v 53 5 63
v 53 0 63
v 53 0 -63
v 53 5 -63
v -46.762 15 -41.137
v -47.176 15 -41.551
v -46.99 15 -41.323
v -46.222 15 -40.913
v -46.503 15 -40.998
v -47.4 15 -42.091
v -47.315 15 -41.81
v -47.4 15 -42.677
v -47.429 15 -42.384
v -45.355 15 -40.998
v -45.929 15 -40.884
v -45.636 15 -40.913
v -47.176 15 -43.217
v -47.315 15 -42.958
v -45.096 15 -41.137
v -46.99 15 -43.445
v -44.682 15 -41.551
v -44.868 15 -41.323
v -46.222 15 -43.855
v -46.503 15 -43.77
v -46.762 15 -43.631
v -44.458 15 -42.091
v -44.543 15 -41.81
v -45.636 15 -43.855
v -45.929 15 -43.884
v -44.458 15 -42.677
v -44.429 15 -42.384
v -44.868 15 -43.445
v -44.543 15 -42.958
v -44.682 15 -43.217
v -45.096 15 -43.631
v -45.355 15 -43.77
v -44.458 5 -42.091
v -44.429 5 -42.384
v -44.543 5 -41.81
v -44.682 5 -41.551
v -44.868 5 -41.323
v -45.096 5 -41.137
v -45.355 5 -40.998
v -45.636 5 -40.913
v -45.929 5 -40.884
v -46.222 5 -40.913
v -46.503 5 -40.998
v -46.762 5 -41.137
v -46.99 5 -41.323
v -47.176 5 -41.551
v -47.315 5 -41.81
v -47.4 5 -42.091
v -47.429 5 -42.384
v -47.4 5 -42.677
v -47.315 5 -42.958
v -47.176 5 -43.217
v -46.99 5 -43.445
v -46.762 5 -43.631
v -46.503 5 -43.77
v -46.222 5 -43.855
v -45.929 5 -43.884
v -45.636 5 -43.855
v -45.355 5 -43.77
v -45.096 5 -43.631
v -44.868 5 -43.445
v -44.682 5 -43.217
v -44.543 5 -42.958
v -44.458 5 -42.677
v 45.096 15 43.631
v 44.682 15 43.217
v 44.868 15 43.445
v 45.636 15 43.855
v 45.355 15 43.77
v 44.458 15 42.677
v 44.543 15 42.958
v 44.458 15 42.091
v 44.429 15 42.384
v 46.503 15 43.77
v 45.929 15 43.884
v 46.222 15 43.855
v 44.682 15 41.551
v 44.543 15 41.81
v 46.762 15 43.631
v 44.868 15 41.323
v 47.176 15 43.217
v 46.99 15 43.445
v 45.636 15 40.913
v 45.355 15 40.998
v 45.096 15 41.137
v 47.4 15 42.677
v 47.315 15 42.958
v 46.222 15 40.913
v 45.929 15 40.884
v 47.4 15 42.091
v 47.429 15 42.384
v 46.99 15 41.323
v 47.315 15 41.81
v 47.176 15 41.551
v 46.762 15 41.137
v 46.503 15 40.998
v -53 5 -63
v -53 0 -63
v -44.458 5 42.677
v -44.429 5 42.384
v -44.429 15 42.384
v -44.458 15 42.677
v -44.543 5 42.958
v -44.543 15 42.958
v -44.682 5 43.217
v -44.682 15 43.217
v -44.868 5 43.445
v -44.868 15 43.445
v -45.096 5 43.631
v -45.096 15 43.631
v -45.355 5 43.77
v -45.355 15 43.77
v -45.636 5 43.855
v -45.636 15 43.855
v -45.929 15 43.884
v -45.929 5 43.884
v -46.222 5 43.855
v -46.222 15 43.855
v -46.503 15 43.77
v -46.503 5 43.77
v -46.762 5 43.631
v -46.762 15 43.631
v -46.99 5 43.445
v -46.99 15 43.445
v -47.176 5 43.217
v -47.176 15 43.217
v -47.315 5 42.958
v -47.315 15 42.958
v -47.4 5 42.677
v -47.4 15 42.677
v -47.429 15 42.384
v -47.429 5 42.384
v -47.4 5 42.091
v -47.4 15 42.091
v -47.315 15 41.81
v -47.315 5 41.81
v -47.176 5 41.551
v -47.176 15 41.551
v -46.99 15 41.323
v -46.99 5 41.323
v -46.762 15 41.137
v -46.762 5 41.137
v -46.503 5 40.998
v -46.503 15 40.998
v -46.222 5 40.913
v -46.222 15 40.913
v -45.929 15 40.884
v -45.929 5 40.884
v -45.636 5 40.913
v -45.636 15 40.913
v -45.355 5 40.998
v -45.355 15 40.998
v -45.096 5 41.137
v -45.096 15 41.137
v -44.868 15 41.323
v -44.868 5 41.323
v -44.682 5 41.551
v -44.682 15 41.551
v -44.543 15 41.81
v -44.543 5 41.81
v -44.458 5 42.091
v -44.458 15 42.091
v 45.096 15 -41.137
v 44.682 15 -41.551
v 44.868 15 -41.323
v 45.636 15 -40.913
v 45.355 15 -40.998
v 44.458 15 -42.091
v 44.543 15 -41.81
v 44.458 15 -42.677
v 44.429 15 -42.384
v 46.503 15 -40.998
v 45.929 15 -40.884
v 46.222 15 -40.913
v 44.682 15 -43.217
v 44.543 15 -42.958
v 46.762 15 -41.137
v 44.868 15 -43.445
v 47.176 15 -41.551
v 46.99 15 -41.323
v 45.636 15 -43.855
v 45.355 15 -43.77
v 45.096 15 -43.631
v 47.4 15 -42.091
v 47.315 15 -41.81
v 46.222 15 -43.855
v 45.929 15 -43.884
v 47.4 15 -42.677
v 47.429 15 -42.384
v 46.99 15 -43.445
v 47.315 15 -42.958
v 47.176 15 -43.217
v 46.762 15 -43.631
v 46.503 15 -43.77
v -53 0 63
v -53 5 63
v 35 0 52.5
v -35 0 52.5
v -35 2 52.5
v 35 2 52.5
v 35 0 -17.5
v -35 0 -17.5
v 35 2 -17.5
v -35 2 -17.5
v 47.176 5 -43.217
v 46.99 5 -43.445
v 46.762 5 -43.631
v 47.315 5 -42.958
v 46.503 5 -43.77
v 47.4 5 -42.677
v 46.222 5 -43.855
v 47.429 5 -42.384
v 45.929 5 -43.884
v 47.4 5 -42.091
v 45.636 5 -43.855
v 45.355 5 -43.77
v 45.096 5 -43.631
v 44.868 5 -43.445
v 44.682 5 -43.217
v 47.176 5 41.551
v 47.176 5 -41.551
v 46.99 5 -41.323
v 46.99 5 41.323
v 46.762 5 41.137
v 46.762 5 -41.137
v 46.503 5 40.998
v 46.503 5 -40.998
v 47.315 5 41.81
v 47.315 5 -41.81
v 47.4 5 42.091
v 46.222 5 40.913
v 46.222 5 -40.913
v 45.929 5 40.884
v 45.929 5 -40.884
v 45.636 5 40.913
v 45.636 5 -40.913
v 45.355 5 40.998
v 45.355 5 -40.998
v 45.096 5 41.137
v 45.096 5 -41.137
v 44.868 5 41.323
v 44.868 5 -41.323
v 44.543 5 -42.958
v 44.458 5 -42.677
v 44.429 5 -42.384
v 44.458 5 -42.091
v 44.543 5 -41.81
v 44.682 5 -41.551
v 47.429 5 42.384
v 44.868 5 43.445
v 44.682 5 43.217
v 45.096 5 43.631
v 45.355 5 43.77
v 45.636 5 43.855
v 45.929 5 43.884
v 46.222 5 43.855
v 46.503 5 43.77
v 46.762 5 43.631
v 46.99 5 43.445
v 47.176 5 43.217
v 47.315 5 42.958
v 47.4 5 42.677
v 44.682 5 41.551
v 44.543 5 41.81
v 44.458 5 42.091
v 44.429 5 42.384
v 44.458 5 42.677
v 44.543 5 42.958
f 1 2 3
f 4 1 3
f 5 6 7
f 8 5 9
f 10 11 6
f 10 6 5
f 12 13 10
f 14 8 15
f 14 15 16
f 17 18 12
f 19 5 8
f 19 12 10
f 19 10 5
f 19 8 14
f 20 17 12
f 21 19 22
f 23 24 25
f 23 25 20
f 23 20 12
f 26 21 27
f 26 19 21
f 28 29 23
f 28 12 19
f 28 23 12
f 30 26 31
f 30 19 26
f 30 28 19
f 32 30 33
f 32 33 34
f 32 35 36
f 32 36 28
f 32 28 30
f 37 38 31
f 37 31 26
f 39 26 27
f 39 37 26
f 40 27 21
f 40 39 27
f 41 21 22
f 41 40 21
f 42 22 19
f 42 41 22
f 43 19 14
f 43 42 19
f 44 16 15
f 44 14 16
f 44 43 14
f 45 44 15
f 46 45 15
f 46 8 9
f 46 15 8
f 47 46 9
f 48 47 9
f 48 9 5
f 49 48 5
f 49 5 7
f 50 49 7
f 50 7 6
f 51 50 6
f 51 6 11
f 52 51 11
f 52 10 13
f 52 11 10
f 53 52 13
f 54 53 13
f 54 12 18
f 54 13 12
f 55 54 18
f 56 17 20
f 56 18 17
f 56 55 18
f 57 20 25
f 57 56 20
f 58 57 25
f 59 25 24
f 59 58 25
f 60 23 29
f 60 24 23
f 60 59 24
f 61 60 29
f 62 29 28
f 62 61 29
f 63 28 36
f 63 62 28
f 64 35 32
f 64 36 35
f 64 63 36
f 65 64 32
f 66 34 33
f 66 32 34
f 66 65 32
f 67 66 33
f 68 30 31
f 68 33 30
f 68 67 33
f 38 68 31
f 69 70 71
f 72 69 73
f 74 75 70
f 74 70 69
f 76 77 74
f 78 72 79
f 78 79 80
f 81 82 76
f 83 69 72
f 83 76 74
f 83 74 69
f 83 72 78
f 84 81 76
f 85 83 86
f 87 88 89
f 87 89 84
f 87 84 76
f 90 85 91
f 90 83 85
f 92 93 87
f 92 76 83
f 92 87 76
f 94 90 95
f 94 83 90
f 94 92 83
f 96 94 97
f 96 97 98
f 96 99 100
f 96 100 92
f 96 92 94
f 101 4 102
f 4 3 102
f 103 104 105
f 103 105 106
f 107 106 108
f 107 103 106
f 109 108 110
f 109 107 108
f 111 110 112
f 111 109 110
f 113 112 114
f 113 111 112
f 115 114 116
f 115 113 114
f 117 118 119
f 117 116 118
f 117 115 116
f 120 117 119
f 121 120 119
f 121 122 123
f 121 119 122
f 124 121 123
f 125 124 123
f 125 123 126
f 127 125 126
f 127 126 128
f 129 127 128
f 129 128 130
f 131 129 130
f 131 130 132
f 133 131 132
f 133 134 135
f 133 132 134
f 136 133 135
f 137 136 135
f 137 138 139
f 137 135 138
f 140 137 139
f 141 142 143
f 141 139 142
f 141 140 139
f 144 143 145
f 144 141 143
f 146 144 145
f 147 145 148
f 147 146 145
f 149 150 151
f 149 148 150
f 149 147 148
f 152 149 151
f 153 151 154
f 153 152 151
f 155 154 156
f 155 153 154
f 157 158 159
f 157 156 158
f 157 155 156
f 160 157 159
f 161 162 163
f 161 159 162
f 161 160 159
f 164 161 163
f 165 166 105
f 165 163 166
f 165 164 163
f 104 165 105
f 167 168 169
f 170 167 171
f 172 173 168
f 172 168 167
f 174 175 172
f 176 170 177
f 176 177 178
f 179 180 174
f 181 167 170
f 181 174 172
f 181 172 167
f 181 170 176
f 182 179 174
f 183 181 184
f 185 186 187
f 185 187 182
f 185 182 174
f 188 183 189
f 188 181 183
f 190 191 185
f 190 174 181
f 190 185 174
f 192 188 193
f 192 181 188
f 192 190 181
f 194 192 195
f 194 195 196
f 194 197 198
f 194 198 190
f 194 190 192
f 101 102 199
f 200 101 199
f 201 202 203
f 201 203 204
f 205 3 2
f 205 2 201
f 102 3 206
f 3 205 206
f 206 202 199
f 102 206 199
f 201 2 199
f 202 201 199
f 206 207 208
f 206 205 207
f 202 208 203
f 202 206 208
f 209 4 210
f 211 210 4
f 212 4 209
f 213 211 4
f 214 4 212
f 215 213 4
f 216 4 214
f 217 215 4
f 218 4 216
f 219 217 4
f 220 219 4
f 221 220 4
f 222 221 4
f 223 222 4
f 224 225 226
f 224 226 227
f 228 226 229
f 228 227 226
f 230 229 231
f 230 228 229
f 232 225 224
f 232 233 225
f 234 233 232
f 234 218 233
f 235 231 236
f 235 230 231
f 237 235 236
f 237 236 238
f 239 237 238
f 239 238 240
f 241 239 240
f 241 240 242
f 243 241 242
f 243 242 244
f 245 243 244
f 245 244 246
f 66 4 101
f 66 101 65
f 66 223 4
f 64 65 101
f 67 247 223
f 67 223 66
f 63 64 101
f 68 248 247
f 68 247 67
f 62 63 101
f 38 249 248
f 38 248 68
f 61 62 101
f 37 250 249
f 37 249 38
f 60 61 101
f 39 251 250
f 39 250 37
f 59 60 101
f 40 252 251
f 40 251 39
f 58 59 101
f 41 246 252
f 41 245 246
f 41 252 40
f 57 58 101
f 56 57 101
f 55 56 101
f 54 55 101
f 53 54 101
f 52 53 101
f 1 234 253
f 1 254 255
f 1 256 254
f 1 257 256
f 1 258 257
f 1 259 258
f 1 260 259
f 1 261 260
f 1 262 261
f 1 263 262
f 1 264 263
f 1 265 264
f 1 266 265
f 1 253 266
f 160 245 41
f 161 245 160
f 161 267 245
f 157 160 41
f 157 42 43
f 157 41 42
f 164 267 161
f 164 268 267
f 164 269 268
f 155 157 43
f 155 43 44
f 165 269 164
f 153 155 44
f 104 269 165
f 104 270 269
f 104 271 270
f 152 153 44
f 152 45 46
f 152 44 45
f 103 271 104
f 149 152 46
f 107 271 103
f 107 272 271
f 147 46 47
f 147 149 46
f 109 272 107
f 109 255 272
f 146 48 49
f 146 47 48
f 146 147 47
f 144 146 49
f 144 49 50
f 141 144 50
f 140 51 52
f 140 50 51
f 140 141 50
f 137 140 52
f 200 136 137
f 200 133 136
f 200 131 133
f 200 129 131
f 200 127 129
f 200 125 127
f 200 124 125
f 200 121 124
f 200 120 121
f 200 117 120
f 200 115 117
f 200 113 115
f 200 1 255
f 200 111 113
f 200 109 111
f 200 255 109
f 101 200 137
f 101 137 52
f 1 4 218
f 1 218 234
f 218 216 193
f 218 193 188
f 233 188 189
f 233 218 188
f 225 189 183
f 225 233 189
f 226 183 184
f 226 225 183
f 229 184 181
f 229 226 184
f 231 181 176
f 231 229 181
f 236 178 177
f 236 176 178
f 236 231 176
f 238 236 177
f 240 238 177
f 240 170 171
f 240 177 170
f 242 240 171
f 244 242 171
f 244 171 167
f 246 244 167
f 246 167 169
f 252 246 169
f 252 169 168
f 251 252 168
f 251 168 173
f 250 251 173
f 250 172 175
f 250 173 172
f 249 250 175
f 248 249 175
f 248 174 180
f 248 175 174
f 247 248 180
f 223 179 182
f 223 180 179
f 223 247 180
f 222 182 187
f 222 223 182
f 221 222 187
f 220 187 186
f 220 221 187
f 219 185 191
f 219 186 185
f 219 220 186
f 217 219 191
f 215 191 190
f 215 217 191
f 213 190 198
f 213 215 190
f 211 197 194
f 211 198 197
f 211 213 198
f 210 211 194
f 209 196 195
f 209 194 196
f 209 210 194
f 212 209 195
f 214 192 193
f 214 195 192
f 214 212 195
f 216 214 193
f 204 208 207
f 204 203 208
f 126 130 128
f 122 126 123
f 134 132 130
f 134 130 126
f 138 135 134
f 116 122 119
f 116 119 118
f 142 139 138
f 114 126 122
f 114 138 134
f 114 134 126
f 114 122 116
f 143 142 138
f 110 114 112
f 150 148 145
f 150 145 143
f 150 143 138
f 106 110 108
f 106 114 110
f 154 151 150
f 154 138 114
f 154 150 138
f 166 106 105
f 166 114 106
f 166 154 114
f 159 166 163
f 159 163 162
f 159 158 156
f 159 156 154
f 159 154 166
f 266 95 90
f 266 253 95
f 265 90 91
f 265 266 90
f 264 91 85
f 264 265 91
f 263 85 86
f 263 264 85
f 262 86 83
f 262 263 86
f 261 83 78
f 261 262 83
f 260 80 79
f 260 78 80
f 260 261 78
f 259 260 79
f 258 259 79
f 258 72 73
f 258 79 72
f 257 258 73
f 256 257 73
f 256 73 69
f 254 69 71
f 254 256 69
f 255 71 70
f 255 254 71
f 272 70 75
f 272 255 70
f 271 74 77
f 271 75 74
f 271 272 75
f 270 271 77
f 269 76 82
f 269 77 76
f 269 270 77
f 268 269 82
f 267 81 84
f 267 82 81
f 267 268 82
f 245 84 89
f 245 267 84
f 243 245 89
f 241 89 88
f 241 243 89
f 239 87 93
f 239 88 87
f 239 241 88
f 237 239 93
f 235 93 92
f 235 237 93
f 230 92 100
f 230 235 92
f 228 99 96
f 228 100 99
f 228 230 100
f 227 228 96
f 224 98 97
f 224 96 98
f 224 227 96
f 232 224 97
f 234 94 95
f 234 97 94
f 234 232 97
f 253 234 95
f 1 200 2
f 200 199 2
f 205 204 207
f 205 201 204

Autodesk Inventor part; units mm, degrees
ref_plane "YZ Plane" through (0, 0, 0) normal (1, 0, 0) x (0, 1, 0)
ref_plane "XZ Plane" through (0, 0, 0) normal (0, 1, 0) x (-1, 0, 0)
ref_plane "XY Plane" through (0, 0, 0) normal (0, 0, 1) x (1, 0, 0)
sketch "Boceto1" plane through (0, 0, 0) normal (0, 1, 0) x (-1, 0, 0)
  line L0 (53, 63) -> (-53, 63)
  line L1 (-53, 63) -> (-53, -63)
  line L2 (-53, -63) -> (53, -63)
  line L3 (53, -63) -> (53, 63)
  point P0 (0, 0)
  point P1 (0, 63)
  dimension "d1" = 106
  dimension "d2" = 126
  dimension "d3" = 53
  dimension "d4" = 63
extrude "Extrusión1" add sketch "Boceto1" along normal blind 5
sketch "Boceto2" plane through (0, 5, 0) normal (0, 1, 0) x (1, 0, 0)
  circle A0 centre (-45.929, -42.384) radius 1.5
  line L0 (-53, -63) -> (53, -63) projected
  line L1 (-53, 63) -> (-53, -63) projected
  line L2 (-81, 0) -> (77, 0)
  line L3 (0, -130) -> (0, 128)
  circle A1 centre (-45.929, 42.384) radius 1.5
  line L4 (-53, -63) -> (-53, 63)
  circle A2 centre (45.929, -42.384) radius 1.5
  circle A3 centre (45.929, 42.384) radius 1.5
  point P0 (0, 0)
  dimension "d7" = 3
  dimension "d8" = 20.616
  dimension "d9" = 7.071
extrude "Extrusión2" add sketch "Boceto2" along normal blind 10 contours A0 | A1 | A2 | A3
sketch "Boceto3" plane through (0, 0, 0) normal (0, -1, 0) x (1, 0, 0)
  line L0 (-35, 52.5) -> (35, 52.5)
  line L1 (35, 52.5) -> (35, -52.5)
  line L2 (35, -52.5) -> (-35, -52.5)
  line L3 (-35, -52.5) -> (-35, 52.5)
  line L4 (53, -63) -> (-53, -63) projected
  line L5 (-53, 63) -> (53, 63) projected
  line L6 (53, 63) -> (53, -63) projected
  line L7 (-53, -63) -> (-53, 63) projected
  line L8 (35, 17.5) -> (-35, 17.5)
  line L9 (35, -17.5) -> (-35, -17.5)
  line L10 (0, 52.5) -> (0, -52.5)
  point P0 (0, 0)
  point P1 (0, 17.5)
  dimension "d12" = 52.5
  dimension "d13" = 126
  dimension "d14" = 106
  dimension "d15" = 52.5
  dimension "d16" = 35
  dimension "d17" = 35
  dimension "d18" = 35
  dimension "d19" = 35
  dimension "d20" = 35
extrude "Extrusión3" cut sketch "Boceto3" against normal blind 2 contours L0 L10 L8 L3 | L0 L1 L8 L10 | L8 L10 L9 L3 | L8 L1 L9 L10
properties part number "Tapa 0"
